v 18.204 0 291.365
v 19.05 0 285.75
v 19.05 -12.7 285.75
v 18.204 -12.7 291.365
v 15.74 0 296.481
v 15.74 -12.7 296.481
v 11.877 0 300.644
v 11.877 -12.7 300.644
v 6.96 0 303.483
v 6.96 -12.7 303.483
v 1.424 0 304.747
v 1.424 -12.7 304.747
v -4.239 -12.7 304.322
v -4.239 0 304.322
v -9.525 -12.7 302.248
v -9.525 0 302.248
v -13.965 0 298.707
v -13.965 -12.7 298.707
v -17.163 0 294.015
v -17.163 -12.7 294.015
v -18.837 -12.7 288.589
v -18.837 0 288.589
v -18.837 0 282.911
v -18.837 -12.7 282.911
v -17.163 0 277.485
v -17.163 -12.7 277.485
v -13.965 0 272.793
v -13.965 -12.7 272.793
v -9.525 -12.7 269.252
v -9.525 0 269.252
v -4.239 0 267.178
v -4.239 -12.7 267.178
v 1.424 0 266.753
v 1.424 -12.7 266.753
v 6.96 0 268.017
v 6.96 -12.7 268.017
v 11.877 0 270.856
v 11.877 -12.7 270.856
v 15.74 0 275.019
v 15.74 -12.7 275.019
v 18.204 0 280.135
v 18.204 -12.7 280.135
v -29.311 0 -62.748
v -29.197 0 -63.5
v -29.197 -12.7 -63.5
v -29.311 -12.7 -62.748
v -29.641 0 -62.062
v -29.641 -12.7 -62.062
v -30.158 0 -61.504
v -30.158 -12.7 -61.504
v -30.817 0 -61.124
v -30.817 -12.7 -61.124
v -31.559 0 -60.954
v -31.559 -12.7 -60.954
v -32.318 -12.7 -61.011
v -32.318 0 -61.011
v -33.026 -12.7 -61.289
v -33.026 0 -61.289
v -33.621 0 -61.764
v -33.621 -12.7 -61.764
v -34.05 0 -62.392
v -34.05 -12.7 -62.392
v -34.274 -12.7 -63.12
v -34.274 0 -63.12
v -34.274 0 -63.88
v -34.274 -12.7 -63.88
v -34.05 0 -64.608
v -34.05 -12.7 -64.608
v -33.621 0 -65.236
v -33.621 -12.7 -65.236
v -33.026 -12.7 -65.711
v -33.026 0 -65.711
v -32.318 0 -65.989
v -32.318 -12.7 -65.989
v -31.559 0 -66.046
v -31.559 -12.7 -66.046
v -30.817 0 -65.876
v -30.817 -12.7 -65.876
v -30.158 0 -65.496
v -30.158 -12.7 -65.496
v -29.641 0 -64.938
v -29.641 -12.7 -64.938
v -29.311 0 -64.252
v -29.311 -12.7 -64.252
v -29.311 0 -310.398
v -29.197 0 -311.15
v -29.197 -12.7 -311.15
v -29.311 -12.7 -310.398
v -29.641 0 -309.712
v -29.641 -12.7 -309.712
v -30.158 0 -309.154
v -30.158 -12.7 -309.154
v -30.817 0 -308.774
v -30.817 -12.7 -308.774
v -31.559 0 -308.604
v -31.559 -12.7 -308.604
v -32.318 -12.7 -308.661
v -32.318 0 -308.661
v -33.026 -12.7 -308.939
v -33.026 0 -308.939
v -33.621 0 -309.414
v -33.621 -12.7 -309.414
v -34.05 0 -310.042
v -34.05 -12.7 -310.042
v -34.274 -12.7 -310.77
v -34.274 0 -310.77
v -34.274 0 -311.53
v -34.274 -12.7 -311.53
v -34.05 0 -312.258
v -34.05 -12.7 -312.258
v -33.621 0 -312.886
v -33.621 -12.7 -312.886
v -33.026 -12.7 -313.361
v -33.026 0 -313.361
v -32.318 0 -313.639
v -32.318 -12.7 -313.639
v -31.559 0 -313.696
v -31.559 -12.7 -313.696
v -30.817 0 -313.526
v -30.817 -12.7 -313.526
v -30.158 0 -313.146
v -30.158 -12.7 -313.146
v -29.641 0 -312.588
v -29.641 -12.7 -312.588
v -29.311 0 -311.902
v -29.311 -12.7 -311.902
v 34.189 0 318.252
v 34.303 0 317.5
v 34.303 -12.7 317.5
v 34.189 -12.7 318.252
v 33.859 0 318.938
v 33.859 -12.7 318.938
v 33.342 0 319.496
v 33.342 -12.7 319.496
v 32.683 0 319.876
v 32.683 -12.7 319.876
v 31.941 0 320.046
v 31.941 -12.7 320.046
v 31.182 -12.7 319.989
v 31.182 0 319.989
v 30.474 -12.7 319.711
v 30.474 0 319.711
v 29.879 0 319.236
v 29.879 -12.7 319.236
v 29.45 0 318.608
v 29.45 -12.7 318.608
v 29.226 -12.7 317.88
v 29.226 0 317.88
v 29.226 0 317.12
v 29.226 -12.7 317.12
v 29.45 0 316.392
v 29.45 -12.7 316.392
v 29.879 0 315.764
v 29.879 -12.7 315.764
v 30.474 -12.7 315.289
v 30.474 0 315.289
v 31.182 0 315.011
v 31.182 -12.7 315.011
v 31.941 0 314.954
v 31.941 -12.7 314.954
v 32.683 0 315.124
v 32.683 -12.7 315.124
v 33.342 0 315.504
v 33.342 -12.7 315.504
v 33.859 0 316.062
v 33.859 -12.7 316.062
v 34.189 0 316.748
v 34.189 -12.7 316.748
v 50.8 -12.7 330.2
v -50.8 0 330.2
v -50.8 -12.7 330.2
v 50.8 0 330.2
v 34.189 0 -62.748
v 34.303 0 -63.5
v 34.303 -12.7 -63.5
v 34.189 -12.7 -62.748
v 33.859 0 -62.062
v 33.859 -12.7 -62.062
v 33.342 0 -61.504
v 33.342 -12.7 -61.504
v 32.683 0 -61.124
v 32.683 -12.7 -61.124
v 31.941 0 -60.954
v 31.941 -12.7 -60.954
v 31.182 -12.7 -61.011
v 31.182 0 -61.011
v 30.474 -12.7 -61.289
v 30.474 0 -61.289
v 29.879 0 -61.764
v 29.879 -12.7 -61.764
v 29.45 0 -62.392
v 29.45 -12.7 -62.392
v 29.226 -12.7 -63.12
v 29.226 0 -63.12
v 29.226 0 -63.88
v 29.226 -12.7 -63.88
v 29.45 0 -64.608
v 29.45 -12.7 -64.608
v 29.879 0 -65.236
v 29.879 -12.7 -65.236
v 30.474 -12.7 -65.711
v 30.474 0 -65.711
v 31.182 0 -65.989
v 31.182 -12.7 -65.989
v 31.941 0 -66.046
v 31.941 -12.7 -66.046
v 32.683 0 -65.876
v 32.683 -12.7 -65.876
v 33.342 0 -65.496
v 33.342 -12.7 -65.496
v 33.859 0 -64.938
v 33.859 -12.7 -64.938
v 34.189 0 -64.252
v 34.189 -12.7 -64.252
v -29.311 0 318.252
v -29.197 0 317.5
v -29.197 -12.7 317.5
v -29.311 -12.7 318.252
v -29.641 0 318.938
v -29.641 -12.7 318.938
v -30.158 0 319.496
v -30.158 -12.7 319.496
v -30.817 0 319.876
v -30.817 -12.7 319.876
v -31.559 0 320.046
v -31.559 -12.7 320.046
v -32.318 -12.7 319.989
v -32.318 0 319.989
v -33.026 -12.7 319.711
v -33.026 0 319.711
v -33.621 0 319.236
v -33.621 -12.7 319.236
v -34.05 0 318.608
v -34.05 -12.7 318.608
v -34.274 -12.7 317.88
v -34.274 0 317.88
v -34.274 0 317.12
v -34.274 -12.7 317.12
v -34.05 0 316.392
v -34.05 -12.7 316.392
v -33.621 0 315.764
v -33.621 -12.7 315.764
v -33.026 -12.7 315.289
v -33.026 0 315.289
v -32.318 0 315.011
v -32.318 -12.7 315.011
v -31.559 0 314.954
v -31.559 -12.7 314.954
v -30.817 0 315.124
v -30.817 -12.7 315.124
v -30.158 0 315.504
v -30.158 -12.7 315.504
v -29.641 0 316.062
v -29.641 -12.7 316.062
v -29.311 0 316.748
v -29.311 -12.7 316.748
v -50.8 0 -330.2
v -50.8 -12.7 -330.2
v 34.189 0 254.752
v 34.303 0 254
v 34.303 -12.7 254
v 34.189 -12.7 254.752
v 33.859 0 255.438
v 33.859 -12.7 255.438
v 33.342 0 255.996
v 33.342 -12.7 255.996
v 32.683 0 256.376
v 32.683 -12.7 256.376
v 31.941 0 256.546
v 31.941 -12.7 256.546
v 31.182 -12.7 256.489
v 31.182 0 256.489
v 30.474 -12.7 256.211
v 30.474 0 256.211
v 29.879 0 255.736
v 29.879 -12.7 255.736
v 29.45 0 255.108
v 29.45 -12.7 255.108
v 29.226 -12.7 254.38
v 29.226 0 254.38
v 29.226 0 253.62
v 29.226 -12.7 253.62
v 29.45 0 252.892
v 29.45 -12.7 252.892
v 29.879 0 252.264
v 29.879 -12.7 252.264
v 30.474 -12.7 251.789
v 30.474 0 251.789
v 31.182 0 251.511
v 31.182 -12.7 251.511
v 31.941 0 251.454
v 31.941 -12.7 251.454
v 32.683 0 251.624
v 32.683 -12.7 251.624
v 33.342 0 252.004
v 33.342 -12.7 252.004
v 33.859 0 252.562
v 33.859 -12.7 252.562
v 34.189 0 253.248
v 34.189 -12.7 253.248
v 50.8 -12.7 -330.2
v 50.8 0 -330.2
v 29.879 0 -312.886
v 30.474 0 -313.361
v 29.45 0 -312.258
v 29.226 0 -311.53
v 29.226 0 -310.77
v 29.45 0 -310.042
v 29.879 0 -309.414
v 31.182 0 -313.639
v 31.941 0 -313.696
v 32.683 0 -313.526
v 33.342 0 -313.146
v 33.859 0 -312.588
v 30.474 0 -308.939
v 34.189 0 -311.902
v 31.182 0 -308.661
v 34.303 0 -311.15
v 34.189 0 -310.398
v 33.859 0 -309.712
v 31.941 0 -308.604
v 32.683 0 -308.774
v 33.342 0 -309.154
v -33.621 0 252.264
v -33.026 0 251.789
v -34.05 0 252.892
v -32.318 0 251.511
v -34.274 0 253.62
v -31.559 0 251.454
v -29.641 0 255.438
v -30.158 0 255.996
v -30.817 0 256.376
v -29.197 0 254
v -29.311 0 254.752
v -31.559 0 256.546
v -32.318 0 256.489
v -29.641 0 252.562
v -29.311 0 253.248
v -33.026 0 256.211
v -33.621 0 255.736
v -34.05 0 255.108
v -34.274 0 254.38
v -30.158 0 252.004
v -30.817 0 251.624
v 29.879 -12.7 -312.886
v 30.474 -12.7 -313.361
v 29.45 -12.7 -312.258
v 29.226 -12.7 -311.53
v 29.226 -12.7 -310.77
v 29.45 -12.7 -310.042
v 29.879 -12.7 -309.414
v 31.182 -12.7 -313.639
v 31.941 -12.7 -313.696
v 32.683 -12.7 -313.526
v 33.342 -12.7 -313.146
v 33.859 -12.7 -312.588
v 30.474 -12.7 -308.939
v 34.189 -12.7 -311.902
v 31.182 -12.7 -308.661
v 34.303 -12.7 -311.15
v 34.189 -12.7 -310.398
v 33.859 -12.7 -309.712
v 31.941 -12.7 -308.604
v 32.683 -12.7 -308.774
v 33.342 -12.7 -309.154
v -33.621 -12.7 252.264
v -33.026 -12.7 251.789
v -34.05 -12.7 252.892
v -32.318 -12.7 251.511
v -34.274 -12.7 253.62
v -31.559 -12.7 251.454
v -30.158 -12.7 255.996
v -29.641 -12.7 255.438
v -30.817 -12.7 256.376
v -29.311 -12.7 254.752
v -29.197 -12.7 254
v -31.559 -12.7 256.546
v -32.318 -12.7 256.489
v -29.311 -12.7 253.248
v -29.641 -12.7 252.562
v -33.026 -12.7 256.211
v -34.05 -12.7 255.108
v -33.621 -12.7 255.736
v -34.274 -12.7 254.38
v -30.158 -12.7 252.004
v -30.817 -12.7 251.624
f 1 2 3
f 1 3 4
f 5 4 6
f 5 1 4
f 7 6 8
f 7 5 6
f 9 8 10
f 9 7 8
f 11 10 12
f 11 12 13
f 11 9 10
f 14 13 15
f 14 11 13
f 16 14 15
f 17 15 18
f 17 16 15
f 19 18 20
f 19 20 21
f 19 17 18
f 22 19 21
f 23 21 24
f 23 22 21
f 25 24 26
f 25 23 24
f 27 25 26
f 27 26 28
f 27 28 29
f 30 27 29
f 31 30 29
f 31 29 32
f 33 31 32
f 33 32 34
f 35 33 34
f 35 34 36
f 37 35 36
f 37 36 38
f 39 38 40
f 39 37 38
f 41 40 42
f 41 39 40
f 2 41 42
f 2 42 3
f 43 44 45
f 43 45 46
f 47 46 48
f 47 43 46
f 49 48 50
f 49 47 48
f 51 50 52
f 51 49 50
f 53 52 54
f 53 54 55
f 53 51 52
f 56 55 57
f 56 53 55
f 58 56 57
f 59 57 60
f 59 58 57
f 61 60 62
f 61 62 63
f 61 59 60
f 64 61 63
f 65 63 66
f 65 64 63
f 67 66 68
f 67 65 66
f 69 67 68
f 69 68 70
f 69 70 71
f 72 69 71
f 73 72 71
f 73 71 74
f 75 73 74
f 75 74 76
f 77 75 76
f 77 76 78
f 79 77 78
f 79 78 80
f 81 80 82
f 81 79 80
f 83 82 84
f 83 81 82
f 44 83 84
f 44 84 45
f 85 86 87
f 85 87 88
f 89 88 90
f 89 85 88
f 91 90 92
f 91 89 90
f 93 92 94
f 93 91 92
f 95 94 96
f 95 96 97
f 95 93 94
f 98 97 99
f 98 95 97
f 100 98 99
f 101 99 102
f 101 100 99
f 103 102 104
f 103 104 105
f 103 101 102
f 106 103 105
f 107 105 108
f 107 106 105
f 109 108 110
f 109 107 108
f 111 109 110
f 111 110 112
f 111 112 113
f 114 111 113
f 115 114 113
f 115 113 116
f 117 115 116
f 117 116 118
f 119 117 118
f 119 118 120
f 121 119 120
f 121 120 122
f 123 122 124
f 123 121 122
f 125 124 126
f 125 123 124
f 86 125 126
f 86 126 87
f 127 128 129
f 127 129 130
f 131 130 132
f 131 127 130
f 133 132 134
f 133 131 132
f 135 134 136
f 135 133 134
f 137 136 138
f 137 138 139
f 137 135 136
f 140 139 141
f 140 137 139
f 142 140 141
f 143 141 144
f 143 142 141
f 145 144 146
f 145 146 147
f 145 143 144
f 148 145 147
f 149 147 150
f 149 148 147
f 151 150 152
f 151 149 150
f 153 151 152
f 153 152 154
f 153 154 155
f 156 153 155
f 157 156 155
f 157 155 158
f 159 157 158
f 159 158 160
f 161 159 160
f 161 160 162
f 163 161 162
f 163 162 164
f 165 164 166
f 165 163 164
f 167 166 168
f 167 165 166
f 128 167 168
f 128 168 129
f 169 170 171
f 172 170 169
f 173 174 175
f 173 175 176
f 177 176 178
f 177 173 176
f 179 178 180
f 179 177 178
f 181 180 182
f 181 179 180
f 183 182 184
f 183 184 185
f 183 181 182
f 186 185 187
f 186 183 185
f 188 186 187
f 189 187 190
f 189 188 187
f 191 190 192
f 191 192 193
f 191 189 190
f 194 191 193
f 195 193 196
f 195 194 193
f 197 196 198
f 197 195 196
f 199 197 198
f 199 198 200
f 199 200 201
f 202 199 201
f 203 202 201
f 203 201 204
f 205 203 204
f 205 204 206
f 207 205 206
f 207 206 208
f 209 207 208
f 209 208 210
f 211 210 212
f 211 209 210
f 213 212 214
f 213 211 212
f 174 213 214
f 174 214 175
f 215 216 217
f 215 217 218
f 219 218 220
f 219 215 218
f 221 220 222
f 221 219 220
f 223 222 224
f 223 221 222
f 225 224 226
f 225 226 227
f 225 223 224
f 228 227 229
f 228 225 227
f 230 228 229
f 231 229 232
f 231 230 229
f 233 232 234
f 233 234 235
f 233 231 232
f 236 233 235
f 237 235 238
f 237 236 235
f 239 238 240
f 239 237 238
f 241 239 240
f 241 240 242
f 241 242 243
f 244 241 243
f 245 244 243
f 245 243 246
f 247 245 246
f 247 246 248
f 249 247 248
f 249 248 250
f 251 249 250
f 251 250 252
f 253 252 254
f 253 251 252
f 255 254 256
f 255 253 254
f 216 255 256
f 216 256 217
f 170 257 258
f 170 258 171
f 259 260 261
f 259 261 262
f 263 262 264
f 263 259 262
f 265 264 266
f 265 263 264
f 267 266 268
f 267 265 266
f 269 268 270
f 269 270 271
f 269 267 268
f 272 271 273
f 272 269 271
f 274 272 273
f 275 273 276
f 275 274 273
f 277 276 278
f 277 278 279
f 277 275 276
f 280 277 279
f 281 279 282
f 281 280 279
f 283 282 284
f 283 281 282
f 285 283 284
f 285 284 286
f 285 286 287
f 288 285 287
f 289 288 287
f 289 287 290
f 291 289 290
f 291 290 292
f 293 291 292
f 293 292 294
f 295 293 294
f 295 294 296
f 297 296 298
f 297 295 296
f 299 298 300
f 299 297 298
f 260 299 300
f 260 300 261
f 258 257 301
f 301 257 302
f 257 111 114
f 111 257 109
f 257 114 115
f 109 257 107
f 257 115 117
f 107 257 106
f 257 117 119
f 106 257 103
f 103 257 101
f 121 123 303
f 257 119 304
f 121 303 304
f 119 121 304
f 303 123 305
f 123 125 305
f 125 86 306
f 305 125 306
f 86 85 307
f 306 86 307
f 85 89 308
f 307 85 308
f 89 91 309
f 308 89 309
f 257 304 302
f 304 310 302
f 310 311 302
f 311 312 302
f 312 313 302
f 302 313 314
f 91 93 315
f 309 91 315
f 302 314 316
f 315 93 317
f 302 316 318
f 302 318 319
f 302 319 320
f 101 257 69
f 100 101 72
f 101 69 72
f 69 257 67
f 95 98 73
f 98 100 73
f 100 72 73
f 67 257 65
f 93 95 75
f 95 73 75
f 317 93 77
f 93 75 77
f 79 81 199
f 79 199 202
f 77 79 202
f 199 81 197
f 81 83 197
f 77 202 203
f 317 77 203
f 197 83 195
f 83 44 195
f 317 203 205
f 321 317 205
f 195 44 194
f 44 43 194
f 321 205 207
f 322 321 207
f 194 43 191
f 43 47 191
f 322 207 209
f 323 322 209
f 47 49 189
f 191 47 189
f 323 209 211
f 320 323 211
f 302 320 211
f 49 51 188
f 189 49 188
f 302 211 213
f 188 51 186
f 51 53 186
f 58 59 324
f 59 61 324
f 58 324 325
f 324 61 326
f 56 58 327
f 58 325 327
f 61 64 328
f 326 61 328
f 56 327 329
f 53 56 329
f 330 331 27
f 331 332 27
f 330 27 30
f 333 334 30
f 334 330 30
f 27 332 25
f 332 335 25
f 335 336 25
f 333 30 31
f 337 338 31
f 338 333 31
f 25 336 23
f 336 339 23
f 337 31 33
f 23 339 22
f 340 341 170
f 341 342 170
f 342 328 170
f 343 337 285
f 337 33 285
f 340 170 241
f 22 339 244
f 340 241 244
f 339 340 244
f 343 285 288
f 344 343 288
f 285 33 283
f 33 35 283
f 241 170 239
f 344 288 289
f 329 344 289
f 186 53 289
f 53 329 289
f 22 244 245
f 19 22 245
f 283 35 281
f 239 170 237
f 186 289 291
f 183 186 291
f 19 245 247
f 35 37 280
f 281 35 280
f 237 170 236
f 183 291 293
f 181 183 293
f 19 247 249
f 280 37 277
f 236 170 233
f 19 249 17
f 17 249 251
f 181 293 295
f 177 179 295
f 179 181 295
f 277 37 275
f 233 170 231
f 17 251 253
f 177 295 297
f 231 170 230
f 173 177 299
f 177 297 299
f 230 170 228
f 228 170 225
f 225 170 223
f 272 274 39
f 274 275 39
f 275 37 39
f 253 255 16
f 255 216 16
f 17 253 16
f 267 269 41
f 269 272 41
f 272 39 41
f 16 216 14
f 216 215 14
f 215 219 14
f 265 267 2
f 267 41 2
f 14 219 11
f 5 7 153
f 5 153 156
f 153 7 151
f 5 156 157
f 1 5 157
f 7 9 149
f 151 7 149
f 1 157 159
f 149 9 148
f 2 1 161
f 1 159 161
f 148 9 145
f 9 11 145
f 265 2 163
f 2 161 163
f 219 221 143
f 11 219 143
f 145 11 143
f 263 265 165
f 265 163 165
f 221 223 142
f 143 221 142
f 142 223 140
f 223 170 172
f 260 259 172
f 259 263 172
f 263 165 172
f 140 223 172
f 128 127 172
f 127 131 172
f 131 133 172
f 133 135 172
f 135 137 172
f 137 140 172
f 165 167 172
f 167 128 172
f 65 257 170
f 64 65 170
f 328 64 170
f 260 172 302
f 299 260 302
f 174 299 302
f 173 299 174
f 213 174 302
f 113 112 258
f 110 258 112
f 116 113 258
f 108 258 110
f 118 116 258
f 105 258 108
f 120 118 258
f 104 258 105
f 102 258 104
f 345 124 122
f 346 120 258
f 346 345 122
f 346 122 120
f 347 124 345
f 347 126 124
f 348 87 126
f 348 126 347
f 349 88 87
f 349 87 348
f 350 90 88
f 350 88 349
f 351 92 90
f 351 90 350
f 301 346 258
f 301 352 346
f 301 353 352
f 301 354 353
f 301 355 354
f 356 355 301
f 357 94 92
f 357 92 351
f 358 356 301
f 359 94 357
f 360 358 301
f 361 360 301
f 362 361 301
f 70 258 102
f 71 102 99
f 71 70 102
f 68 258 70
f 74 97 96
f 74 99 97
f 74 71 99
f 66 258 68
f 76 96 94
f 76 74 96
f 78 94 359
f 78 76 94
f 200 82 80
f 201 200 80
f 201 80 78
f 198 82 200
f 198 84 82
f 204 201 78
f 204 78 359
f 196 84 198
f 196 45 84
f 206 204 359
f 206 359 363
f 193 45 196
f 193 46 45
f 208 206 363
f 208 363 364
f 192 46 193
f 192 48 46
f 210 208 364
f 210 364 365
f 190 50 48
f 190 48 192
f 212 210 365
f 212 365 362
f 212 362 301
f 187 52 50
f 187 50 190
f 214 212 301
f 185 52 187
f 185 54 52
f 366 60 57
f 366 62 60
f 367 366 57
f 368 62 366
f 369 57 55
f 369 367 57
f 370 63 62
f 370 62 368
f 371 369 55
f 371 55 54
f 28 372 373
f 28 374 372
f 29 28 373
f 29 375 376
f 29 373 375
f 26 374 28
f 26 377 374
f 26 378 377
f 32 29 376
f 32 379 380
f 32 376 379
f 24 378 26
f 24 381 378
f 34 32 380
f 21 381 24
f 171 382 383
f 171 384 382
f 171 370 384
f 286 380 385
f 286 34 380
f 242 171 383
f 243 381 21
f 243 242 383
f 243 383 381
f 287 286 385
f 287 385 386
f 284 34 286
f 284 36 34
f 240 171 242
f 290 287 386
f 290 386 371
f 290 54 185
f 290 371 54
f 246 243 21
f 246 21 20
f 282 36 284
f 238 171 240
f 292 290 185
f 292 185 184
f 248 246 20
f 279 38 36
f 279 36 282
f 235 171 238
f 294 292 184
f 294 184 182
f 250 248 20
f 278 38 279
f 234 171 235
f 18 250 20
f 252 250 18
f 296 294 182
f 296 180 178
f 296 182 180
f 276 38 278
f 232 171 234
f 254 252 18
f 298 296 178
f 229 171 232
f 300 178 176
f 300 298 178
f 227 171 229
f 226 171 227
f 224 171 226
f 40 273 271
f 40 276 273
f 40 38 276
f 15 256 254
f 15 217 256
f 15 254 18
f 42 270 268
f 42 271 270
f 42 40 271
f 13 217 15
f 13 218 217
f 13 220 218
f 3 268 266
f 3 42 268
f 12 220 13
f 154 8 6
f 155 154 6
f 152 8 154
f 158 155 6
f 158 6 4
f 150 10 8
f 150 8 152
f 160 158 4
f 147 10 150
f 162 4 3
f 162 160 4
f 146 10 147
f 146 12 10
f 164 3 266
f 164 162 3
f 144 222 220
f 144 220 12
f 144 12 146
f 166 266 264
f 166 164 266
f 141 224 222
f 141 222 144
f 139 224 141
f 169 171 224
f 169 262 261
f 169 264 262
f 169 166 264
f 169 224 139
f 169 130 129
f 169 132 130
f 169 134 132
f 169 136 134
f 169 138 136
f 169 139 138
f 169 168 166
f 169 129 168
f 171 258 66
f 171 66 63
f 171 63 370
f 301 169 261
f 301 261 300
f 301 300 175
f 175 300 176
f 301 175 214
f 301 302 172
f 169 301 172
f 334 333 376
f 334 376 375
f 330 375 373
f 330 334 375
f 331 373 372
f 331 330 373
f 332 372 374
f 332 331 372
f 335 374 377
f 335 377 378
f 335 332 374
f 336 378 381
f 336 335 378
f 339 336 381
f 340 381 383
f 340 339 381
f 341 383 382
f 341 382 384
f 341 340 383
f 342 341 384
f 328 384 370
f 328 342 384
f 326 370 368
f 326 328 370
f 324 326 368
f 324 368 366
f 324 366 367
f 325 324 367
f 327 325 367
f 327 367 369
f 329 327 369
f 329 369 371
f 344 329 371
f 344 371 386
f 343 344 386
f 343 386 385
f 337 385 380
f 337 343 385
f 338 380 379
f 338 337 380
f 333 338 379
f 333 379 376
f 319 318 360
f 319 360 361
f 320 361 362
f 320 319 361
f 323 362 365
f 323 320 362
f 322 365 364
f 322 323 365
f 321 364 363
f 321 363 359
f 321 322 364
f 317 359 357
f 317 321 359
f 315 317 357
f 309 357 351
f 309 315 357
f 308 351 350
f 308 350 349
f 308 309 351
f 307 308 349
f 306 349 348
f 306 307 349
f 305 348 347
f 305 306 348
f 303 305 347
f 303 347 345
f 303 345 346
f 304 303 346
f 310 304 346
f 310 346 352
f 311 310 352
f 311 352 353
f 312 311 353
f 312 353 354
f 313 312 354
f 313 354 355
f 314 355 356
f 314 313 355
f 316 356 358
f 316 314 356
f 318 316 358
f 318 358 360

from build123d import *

# Parameters (mm, degrees)
F0_W     = 101.6
F0_H     = 660.4
F0_R     = 2.5527
F0_R_2   = 19.05
F1_DEPTH = 12.7


with BuildPart() as f1:
    # F0 (on Front) → F1 (new body)
    with BuildSketch(Plane.XZ):
        Rectangle(F0_W, F0_H)
        with Locations((-31.75, -311.15)):
            Circle(F0_R, mode=Mode.SUBTRACT)
        with Locations((-31.75, -63.5)):
            Circle(F0_R, mode=Mode.SUBTRACT)
        with Locations((31.75, -311.15)):
            Circle(F0_R, mode=Mode.SUBTRACT)
        with Locations((31.75, -63.5)):
            Circle(F0_R, mode=Mode.SUBTRACT)
        with Locations((-31.75, 254)):
            Circle(F0_R, mode=Mode.SUBTRACT)
        with Locations((-31.75, 317.5)):
            Circle(F0_R, mode=Mode.SUBTRACT)
        with Locations((0, 285.75)):
            Circle(F0_R_2, mode=Mode.SUBTRACT)
        with Locations((31.75, 254)):
            Circle(F0_R, mode=Mode.SUBTRACT)
        with Locations((31.75, 317.5)):
            Circle(F0_R, mode=Mode.SUBTRACT)
    extrude(amount=F1_DEPTH)


solid = f1.part
